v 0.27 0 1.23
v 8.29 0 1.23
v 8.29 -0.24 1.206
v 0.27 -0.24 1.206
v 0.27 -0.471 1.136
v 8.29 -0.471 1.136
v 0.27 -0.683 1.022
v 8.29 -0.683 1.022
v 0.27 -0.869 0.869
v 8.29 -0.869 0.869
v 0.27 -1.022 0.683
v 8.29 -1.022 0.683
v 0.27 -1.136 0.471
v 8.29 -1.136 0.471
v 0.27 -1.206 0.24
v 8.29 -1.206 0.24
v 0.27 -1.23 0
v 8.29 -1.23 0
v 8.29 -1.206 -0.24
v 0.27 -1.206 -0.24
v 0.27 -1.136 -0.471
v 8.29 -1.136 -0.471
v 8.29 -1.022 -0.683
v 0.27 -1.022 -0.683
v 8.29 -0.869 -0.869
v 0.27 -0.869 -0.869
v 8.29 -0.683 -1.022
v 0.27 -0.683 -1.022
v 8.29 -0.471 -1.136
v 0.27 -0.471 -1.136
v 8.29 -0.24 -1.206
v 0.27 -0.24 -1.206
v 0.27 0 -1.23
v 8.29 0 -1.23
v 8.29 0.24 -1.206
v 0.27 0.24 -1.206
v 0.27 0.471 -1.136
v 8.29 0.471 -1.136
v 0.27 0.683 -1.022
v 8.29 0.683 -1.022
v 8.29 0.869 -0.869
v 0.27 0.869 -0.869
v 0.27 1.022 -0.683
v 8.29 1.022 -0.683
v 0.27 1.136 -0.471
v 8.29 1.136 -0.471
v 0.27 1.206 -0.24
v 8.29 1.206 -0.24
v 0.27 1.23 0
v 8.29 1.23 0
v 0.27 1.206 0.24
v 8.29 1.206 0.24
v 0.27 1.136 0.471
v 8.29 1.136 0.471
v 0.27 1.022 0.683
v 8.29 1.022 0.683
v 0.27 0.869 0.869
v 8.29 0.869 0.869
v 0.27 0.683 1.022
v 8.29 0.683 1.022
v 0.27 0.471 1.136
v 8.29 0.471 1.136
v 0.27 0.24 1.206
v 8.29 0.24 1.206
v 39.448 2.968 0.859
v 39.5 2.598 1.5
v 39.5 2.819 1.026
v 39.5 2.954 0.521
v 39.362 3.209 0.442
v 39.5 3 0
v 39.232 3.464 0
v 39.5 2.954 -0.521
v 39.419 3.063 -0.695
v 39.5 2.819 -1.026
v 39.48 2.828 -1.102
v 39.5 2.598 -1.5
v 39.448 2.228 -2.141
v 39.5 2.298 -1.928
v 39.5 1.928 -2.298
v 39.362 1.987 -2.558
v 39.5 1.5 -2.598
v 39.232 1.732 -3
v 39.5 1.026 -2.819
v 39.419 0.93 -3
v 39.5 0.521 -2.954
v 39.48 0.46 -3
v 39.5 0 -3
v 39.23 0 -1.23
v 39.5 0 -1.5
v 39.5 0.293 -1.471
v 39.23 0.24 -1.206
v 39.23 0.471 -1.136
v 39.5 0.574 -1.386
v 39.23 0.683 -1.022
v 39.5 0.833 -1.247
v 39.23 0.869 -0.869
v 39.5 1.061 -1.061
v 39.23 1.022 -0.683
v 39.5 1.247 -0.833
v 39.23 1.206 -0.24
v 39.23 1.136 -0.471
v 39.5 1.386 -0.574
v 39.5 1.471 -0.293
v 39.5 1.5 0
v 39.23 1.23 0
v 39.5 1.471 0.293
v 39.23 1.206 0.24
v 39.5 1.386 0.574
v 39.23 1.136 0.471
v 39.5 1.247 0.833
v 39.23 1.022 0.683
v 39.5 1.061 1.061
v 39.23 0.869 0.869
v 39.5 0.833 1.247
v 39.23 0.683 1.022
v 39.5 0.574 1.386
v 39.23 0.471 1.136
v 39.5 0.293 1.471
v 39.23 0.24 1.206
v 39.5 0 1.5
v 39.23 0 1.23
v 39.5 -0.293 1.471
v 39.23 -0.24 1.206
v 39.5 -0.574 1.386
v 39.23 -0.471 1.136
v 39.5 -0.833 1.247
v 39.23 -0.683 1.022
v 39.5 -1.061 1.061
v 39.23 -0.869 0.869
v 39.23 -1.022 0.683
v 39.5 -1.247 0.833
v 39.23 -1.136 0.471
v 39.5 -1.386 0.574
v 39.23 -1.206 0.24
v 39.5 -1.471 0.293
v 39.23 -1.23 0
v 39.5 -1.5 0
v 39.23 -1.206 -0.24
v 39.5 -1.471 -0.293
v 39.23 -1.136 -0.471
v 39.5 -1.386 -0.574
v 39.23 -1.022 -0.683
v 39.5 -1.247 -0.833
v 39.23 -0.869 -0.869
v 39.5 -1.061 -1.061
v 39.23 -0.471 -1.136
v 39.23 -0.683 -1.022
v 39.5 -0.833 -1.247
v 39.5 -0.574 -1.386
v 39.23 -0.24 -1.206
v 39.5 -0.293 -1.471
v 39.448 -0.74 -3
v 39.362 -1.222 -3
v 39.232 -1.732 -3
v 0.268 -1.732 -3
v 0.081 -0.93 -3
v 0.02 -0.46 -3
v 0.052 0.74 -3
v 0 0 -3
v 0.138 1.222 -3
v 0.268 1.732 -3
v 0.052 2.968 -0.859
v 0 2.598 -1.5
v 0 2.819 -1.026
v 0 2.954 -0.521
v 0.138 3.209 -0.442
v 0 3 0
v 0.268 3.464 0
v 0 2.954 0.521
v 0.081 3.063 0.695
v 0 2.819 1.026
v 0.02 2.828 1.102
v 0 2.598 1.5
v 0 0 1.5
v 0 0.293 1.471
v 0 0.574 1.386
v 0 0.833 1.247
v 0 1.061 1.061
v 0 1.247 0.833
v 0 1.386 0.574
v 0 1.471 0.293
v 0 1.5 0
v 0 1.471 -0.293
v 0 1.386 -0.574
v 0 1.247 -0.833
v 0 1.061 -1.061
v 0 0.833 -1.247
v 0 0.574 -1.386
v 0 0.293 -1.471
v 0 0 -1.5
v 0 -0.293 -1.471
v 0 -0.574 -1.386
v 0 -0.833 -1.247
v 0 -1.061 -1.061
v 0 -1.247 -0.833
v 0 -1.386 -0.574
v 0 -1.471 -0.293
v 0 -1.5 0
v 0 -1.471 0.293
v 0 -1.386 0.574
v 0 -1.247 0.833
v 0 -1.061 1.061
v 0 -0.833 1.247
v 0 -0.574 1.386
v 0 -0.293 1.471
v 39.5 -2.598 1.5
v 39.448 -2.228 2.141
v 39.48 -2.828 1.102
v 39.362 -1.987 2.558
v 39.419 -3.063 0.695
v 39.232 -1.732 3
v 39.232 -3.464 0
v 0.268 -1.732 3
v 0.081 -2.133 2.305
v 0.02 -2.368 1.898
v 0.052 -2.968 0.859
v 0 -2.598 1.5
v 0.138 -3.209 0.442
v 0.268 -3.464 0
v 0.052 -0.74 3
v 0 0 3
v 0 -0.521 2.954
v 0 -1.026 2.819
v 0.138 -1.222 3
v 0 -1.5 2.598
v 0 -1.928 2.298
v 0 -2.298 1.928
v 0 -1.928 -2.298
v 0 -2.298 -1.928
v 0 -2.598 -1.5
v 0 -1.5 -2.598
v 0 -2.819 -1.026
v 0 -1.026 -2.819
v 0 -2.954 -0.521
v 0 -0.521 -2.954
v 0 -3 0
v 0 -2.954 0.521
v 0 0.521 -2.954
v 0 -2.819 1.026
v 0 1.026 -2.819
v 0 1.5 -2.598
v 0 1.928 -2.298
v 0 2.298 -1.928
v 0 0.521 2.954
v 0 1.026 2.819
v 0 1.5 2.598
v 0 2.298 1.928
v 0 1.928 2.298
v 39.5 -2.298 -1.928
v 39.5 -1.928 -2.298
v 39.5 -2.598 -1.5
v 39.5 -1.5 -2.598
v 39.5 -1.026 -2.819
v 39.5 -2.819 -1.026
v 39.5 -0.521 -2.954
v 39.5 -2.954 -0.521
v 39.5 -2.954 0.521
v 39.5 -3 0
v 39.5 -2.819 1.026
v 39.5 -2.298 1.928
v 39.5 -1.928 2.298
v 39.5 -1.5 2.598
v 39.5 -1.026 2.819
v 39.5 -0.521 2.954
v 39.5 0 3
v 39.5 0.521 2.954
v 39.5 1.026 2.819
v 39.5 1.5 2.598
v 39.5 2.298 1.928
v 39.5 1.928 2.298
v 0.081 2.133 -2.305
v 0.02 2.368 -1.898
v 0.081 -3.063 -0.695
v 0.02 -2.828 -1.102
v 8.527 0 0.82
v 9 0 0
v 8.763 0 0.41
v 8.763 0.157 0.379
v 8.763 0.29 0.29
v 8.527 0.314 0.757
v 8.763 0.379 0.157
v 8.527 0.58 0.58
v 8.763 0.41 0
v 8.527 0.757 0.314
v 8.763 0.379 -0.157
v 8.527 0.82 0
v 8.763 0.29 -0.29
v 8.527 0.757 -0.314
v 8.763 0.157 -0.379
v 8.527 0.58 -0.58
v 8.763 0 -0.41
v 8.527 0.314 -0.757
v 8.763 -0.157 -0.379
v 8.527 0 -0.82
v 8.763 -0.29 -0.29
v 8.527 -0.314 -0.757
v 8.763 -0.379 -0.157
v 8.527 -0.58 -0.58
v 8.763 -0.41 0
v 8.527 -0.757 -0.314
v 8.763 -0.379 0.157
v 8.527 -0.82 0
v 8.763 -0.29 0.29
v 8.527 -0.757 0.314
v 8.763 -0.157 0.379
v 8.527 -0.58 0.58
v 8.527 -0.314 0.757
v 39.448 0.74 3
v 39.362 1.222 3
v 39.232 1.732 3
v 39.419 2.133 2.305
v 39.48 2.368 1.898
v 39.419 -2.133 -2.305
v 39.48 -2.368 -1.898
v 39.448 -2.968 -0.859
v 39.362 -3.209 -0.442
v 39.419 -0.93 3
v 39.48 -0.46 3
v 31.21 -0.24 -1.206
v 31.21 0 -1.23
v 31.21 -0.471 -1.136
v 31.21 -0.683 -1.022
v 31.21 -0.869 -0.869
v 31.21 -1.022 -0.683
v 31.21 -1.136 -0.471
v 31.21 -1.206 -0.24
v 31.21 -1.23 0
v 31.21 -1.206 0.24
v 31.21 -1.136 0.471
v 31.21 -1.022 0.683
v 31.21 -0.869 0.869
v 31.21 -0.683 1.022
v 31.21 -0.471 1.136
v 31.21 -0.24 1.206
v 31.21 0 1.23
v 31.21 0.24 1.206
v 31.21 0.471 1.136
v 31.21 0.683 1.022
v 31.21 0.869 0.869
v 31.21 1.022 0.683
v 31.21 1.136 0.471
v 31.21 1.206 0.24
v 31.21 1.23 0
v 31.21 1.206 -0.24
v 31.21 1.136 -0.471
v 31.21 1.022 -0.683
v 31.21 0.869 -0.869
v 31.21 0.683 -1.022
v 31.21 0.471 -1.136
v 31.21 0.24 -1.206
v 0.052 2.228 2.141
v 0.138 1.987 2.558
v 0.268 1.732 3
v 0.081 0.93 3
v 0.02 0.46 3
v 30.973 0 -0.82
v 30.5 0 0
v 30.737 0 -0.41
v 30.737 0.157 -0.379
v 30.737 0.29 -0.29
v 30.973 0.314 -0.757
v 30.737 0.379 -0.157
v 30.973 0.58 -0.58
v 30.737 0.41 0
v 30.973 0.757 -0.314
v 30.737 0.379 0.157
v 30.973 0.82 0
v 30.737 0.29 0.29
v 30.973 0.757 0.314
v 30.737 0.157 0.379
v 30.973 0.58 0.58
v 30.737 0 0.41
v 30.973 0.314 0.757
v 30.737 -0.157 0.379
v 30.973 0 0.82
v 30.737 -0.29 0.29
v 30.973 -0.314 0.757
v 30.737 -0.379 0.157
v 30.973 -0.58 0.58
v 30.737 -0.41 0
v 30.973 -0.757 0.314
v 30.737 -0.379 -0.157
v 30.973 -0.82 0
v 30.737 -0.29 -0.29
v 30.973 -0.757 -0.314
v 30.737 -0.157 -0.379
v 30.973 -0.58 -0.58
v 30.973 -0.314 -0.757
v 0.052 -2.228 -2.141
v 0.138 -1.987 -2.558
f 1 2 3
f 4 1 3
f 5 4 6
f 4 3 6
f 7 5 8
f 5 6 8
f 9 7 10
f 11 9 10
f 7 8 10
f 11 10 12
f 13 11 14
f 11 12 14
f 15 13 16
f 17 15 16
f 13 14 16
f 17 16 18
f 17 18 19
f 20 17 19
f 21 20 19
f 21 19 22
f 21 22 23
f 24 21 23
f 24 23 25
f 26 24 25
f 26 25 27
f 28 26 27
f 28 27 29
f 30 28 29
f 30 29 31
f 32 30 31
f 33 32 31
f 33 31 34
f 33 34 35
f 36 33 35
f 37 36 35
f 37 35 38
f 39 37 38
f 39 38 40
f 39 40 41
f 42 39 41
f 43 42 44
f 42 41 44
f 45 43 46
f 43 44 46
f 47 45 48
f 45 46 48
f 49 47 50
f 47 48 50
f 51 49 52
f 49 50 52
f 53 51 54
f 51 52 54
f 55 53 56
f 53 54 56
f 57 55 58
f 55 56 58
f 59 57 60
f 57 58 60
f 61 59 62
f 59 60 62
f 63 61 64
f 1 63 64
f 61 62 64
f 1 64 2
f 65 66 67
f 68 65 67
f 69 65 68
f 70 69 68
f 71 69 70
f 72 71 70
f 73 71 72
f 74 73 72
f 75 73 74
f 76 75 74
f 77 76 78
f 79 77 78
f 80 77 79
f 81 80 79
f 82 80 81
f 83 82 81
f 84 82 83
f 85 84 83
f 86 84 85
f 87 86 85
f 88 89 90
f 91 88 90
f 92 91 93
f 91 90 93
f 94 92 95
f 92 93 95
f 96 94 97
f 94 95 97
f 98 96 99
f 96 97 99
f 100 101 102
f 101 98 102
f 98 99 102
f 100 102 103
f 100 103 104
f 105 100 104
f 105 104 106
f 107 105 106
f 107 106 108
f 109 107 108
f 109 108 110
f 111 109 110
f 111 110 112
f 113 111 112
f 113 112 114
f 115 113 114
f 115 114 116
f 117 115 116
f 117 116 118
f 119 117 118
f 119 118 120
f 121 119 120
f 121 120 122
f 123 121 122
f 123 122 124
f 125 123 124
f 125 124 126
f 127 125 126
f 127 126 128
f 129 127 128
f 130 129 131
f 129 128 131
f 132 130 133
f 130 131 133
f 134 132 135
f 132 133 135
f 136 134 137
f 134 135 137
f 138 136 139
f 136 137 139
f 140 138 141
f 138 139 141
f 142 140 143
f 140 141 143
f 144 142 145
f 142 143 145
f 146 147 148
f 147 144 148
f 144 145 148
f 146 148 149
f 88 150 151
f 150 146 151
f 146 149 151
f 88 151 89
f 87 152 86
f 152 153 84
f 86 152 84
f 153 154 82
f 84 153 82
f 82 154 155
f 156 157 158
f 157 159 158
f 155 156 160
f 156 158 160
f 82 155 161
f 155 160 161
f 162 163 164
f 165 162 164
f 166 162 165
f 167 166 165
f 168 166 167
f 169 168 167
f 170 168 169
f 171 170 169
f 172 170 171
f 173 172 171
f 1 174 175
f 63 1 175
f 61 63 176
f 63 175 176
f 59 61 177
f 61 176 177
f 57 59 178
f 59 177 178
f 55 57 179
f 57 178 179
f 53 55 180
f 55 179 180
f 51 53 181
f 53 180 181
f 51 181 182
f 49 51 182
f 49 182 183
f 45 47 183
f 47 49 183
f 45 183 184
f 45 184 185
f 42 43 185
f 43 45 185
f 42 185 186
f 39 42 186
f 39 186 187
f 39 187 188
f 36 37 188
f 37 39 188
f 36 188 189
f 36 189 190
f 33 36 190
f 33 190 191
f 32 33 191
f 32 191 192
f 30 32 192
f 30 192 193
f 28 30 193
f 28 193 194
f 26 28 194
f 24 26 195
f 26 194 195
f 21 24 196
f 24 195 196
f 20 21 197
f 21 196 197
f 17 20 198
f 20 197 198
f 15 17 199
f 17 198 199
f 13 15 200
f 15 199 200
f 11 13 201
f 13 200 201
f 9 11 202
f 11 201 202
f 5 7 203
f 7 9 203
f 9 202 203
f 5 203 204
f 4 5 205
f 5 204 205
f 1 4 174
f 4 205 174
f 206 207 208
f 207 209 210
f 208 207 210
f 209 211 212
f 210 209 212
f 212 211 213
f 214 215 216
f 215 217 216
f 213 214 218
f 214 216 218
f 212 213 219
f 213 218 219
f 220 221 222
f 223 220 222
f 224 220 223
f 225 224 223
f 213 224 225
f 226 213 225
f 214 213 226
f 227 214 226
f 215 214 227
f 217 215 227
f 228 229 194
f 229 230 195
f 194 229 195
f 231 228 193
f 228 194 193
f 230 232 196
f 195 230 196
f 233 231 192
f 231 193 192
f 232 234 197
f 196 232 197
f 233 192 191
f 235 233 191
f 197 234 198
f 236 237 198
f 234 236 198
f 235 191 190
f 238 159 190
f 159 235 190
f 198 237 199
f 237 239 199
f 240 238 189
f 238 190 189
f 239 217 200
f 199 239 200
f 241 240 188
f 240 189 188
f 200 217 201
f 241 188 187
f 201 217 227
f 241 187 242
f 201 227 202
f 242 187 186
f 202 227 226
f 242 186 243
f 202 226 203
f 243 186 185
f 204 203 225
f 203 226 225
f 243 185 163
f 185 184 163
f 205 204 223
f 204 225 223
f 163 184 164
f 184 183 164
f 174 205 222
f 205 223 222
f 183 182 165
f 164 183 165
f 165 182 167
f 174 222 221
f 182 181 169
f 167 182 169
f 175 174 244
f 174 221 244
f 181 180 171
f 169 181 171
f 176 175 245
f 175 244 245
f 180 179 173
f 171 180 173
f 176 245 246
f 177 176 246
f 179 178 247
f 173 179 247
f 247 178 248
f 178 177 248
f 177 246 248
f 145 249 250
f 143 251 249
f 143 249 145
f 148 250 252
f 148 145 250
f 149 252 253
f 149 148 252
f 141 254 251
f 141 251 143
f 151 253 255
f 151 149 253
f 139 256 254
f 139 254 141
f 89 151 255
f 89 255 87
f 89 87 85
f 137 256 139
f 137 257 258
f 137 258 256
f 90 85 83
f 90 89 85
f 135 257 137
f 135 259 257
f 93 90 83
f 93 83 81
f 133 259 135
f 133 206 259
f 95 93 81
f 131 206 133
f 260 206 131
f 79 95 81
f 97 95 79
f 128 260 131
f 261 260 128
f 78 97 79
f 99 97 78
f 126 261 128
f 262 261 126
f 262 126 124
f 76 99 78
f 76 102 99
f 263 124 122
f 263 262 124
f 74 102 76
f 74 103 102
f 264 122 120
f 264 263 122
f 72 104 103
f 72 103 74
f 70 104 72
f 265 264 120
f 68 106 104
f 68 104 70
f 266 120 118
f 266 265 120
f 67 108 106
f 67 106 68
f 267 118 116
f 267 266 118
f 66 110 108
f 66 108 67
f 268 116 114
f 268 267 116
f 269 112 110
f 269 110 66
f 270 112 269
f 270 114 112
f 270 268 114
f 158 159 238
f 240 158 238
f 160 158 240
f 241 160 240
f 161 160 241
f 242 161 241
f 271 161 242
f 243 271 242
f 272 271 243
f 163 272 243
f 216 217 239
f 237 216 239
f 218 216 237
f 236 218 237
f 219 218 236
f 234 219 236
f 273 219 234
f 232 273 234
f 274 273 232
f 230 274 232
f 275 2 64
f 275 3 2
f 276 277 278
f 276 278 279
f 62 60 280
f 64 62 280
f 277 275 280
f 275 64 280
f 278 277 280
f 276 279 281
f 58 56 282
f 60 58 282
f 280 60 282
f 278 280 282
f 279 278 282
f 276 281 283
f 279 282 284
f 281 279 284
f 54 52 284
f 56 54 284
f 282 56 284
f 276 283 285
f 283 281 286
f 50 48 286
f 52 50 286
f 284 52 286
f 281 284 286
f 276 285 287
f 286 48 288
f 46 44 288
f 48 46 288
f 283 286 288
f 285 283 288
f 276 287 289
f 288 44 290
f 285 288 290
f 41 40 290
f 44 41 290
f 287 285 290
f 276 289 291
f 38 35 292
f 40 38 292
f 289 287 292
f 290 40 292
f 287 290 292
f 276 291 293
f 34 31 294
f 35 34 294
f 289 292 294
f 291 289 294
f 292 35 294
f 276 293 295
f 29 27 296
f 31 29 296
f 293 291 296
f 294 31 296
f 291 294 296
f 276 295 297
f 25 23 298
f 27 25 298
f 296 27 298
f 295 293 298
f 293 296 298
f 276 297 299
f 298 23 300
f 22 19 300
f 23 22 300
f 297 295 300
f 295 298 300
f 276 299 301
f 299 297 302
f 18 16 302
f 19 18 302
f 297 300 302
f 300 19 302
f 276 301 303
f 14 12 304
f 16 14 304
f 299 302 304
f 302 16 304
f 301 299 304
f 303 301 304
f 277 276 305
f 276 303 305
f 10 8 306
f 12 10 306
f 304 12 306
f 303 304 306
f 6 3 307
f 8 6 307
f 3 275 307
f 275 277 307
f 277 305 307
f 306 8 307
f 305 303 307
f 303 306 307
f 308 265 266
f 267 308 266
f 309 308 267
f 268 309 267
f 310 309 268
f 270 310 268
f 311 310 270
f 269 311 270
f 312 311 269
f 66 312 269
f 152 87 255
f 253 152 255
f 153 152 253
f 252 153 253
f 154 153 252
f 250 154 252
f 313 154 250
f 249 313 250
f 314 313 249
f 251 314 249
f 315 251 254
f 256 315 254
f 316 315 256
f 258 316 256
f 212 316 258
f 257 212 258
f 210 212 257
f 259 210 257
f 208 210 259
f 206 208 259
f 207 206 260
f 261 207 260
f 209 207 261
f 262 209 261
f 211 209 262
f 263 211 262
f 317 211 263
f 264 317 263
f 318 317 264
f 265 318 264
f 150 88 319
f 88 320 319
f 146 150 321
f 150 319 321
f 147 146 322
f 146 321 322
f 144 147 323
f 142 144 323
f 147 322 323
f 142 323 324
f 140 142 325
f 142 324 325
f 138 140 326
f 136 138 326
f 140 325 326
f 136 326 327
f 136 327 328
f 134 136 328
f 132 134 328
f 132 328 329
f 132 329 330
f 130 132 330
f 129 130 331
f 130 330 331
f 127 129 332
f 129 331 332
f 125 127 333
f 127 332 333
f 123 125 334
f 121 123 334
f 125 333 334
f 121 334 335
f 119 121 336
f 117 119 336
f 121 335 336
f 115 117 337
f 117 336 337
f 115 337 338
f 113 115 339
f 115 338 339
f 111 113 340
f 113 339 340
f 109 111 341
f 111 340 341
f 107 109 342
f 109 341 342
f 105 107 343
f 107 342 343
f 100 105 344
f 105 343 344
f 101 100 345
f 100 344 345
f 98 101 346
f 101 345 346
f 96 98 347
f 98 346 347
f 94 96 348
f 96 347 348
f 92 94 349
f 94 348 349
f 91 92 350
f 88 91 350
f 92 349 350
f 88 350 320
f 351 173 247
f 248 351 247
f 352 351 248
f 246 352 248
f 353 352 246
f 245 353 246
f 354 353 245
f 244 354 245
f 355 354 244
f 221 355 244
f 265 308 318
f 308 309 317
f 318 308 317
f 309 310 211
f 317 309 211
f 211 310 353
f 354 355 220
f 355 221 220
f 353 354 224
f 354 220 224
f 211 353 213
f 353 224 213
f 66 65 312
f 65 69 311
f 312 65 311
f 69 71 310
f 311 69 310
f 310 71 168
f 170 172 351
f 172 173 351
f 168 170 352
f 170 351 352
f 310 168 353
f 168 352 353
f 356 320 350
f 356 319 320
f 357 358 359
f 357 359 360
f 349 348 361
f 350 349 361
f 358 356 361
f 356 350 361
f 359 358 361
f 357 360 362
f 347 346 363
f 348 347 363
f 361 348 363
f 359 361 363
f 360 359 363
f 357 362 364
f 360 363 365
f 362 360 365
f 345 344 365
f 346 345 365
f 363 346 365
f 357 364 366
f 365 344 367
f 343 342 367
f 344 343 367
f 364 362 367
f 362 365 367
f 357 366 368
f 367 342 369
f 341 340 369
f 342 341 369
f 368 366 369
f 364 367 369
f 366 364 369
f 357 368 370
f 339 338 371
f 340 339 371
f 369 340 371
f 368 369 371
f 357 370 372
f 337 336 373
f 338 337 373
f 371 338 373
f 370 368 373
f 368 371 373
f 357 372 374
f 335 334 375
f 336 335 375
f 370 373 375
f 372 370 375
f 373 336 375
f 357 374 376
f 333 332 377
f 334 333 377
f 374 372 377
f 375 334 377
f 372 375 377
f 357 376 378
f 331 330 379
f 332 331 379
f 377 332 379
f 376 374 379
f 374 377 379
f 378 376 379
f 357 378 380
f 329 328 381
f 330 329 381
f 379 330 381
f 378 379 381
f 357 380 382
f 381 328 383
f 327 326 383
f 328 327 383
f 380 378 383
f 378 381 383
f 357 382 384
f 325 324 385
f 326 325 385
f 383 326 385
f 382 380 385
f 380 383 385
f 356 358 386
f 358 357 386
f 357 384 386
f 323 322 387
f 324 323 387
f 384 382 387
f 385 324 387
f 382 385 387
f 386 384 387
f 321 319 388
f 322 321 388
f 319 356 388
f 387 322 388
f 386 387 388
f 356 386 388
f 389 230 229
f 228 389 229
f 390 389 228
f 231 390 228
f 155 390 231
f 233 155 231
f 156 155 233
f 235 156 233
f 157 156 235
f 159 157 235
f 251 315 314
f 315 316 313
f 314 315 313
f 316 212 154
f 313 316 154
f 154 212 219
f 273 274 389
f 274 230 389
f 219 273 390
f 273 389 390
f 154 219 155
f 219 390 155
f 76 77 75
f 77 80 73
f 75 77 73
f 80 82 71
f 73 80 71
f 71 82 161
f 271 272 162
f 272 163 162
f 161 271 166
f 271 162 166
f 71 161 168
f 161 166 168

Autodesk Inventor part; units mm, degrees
sketch "Sketch_1" plane through (0, 0, 0) normal (0, 0, 1) x (1, 0, 0)
  line L0 (39.5, 0) -> (0, 0)
  line L1 (0, 0) -> (0, 3)
  line L2 (0, 3) -> (0.5485, 3.95)
  line L3 (0.5485, 3.95) -> (38.9515, 3.95)
  line L4 (38.9515, 3.95) -> (39.5, 3)
  line L5 (39.5, 3) -> (39.5, 0)
  line L6 (39.5, 0) -> (0, 0)
revolve "Revolution1" add sketch "Sketch_1" angle 360 about axis through (39.5, 0, 0) along (1, 0, 0)
sketch "Sketch_2" plane through (0, 0, 0) normal (1, 0, 0) x (0, 1, 0)
  line L0 (6, 6) -> (-6, 6)
  line L1 (-6, 6) -> (-6, -6)
  line L2 (-6, -6) -> (6, -6)
  line L3 (6, -6) -> (6, 6)
  line L4 (-1.7321, 3) -> (-3.4641, 0)
  line L5 (-3.4641, 0) -> (-1.7321, -3)
  line L6 (-1.7321, -3) -> (1.7321, -3)
  line L7 (1.7321, -3) -> (3.4641, 0)
  line L8 (3.4641, 0) -> (1.7321, 3)
  line L9 (1.7321, 3) -> (-1.7321, 3)
extrude "Extrusion1" cut sketch "Sketch_2" along normal blind 39.5
sketch "Sketch3" plane through (0, 0, 0) normal (-1, 0, 0) x (0, 0, 1)
  point P0 (0, 0)
hole "Hole1" at (0, 0, 0) direction (1, 0, 0) diameter 2.459 depth 8.2901 tip angle 120 countersink diameter 3 countersink angle 90 thread size "M3x0.5" class "6H" standard "ISO Metric profile"
sketch "Sketch4" plane through (39.5, 0, 0) normal (1, 0, 0) x (0, 0, -1)
  point P0 (0, 0)
hole "Hole2" at (39.5, 0, 0) direction (-1, 0, 0) diameter 2.459 depth 8.2901 tip angle 120 countersink diameter 3 countersink angle 90 thread size "M3x0.5" class "6H" standard "ISO Metric profile"
ref_plane "C3_XY" through (39.5, 0, 0) normal (-1, 0, 0) x (0, 0, -1)
ref_plane "C3_YZ" through (39.5, 0, 0) normal (0, 0, -1) x (0, -1, 0)
ref_plane "C3_ZX" through (39.5, 0, 0) normal (0, -1, 0) x (-1, 0, 0)
properties part number "ABLSBF6-39.5-M3-N3" material "Aluminum 2014-T4"
